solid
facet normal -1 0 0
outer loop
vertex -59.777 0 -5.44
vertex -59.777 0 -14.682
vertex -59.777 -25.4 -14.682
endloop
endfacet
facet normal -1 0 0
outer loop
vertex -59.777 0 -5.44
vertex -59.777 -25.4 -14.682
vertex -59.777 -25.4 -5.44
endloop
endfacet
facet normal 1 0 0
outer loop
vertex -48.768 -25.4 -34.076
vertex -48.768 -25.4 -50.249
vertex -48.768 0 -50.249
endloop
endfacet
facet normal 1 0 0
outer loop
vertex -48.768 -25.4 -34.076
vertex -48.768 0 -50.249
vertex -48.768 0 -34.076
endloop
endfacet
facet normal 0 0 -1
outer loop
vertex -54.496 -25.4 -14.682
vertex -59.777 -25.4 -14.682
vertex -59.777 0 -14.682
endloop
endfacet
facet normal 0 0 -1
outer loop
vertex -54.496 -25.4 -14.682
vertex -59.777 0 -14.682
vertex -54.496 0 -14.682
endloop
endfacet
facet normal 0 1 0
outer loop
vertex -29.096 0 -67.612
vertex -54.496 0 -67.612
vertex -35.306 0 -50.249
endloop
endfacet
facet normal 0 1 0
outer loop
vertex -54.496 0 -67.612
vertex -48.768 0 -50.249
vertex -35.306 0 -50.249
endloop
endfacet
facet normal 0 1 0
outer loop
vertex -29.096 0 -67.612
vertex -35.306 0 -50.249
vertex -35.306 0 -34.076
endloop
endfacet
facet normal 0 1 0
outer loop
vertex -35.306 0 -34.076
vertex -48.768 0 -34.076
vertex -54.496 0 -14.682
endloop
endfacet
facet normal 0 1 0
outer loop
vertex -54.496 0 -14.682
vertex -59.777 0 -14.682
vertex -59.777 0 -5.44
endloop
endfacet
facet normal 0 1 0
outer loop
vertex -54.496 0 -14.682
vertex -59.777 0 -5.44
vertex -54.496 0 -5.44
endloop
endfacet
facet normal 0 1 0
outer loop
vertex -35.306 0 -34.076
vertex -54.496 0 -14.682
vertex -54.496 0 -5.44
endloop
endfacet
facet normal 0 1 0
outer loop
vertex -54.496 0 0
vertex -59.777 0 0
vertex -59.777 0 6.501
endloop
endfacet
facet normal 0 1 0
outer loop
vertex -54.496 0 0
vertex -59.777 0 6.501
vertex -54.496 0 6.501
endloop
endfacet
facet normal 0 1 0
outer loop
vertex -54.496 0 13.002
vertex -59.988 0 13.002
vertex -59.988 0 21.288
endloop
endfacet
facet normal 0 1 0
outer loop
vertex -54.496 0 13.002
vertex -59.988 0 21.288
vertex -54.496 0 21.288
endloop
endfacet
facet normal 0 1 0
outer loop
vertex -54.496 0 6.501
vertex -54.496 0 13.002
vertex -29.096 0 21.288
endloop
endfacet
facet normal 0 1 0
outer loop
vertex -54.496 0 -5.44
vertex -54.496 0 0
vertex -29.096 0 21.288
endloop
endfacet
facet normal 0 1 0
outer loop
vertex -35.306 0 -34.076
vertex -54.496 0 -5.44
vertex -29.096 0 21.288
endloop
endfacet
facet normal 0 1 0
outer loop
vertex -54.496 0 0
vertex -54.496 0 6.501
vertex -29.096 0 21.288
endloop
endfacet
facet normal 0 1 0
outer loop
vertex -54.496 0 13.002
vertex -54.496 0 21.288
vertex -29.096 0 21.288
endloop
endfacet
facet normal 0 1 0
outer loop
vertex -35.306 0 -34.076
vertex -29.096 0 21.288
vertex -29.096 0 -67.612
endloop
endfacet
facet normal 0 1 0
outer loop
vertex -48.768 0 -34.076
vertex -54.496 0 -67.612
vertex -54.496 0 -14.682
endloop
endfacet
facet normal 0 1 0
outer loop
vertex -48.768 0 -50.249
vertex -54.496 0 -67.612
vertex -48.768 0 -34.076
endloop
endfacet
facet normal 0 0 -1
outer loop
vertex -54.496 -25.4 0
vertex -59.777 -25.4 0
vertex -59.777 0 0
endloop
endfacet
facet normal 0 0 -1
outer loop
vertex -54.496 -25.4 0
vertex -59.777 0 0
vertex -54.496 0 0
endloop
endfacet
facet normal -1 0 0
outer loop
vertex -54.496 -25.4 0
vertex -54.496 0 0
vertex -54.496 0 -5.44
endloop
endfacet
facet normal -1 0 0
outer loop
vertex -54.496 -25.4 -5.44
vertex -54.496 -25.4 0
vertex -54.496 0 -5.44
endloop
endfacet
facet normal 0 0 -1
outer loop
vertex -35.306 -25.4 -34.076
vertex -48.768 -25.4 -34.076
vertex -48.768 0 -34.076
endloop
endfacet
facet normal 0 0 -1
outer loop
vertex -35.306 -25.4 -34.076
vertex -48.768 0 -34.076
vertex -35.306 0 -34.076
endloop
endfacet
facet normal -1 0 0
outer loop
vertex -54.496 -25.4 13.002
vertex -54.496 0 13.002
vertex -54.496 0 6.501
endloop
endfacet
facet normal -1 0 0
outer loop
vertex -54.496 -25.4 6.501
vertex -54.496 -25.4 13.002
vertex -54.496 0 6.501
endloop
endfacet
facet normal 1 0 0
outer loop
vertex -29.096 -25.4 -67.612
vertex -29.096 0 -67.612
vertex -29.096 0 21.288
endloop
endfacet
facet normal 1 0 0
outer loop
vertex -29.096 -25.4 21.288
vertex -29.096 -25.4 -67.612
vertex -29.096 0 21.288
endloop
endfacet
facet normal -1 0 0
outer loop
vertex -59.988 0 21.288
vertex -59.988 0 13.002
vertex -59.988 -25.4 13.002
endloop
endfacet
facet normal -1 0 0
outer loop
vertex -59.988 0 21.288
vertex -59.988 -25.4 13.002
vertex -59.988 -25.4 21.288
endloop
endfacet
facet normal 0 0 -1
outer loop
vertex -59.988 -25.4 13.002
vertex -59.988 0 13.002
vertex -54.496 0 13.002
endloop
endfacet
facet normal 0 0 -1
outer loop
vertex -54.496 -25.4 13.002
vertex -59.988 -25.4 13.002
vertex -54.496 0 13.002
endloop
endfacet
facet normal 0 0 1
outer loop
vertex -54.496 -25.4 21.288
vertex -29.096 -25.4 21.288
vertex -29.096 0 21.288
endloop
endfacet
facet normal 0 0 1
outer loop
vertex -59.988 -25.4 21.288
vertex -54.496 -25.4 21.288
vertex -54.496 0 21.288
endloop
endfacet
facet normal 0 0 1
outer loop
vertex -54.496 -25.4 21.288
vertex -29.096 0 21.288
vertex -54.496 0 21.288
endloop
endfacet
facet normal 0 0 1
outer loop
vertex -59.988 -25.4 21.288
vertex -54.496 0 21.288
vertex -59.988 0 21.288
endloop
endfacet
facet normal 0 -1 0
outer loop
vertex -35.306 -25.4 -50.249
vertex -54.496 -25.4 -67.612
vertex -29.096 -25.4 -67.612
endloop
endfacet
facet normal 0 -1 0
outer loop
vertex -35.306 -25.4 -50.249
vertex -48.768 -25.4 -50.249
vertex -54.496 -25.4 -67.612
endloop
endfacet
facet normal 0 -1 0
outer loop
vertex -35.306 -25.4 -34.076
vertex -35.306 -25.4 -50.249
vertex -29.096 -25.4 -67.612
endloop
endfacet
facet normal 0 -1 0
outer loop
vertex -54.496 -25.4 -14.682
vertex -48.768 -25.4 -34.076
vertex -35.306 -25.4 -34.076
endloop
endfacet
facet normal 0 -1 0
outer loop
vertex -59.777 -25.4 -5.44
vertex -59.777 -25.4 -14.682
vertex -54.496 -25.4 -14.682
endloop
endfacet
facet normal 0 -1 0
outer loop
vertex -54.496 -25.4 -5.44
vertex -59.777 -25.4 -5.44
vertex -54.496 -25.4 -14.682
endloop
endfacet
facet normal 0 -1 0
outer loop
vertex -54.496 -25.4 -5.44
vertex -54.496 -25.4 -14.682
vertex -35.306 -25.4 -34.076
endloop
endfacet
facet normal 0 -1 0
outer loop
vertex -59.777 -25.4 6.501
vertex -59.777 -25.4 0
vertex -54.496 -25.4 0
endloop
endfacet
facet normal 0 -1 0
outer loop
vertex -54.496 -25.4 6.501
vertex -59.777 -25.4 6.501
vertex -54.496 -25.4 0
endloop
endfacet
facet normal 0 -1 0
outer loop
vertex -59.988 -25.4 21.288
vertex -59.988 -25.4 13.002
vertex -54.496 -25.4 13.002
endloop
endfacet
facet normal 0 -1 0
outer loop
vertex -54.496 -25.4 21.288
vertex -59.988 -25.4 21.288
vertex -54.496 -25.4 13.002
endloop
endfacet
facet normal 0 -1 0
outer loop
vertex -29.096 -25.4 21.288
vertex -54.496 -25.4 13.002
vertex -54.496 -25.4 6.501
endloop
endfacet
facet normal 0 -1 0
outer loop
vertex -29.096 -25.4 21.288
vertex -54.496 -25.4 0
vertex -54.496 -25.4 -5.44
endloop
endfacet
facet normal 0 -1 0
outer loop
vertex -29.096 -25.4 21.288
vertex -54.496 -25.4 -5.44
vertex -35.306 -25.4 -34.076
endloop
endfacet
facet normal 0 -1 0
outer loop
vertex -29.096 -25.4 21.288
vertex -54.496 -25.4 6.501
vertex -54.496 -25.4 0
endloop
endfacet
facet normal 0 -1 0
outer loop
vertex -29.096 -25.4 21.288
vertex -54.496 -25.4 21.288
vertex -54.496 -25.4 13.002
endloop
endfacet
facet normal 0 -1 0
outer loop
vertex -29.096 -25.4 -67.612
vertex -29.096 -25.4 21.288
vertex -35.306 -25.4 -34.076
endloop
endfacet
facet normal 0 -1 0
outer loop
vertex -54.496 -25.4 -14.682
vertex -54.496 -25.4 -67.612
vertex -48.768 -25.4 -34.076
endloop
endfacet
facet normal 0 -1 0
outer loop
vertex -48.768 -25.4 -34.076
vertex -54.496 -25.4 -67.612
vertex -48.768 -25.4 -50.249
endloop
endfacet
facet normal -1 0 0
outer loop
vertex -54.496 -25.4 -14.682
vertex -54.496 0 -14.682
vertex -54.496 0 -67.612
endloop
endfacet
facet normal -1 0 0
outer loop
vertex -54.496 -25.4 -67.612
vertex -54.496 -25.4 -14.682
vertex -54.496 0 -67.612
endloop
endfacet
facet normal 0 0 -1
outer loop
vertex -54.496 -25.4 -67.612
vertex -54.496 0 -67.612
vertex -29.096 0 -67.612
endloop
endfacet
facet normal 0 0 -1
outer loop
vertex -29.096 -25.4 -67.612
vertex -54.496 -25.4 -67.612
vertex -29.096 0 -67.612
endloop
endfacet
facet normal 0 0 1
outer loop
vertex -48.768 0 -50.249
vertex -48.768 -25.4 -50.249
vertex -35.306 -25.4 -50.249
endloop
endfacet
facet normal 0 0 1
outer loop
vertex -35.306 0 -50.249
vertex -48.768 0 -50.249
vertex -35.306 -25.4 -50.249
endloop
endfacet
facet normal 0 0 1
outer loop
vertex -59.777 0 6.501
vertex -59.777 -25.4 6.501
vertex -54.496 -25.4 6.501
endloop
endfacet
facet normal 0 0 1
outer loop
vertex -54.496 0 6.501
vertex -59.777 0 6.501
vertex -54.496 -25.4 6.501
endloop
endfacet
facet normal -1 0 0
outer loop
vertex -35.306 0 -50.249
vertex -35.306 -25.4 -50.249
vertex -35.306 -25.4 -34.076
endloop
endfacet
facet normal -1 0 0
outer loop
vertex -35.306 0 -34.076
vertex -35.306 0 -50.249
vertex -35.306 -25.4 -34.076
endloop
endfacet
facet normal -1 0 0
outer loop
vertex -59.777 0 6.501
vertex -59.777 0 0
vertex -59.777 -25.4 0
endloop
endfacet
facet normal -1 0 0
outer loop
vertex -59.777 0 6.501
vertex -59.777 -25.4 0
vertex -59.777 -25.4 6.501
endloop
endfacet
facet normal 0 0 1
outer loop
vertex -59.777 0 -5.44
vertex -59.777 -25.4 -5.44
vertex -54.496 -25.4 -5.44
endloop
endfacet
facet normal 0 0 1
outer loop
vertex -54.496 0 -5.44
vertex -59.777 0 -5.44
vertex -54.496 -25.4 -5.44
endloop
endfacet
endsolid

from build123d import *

# Parameters (mm, degrees)
F0_W     = 13.4628936648
F0_H     = 16.1730796099
F0_W_2   = 5.4922168999
F0_H_2   = 8.2855048865
F0_W_3   = 5.2812833667
F0_H_3   = 6.5011191182
F0_H_4   = 9.2424242757
F1_DEPTH = 25.4


with BuildPart() as f1:
    # F0 (on Front) → F1 (new body)
    with BuildSketch(Plane.XZ):
        Polygon((-29.0956337333, -67.6122568771), (-29.0956337333, -16.8122568771), (-54.4956337333, -16.8122568771), (-54.4956337333, -23.1622568771), (-54.4956337333, -67.6122568771), align=None)
        with Locations((-42.03697294, -42.1628169715)):
            Rectangle(F0_W, F0_H, mode=Mode.SUBTRACT)
        Polygon((-29.0956337333, 21.2877431229), (-54.4956337333, 21.2877431229), (-54.4956337333, 13.0022382364), (-54.4956337333, 6.5011191182), (-54.4956337333, 0), (-54.4956337333, -5.4398714565), (-54.4956337333, -14.6822957322), (-54.4956337333, -16.8122568771), (-29.0956337333, -16.8122568771), align=None)
        with Locations((-57.2417421832, 17.1449906796)):
            Rectangle(F0_W_2, F0_H_2)
        with Locations((-57.1362754166, 3.2505595591)):
            Rectangle(F0_W_3, F0_H_3)
        with Locations((-57.1362754166, -10.0610835943)):
            Rectangle(F0_W_3, F0_H_4)
    extrude(amount=F1_DEPTH)


solid = f1.part
